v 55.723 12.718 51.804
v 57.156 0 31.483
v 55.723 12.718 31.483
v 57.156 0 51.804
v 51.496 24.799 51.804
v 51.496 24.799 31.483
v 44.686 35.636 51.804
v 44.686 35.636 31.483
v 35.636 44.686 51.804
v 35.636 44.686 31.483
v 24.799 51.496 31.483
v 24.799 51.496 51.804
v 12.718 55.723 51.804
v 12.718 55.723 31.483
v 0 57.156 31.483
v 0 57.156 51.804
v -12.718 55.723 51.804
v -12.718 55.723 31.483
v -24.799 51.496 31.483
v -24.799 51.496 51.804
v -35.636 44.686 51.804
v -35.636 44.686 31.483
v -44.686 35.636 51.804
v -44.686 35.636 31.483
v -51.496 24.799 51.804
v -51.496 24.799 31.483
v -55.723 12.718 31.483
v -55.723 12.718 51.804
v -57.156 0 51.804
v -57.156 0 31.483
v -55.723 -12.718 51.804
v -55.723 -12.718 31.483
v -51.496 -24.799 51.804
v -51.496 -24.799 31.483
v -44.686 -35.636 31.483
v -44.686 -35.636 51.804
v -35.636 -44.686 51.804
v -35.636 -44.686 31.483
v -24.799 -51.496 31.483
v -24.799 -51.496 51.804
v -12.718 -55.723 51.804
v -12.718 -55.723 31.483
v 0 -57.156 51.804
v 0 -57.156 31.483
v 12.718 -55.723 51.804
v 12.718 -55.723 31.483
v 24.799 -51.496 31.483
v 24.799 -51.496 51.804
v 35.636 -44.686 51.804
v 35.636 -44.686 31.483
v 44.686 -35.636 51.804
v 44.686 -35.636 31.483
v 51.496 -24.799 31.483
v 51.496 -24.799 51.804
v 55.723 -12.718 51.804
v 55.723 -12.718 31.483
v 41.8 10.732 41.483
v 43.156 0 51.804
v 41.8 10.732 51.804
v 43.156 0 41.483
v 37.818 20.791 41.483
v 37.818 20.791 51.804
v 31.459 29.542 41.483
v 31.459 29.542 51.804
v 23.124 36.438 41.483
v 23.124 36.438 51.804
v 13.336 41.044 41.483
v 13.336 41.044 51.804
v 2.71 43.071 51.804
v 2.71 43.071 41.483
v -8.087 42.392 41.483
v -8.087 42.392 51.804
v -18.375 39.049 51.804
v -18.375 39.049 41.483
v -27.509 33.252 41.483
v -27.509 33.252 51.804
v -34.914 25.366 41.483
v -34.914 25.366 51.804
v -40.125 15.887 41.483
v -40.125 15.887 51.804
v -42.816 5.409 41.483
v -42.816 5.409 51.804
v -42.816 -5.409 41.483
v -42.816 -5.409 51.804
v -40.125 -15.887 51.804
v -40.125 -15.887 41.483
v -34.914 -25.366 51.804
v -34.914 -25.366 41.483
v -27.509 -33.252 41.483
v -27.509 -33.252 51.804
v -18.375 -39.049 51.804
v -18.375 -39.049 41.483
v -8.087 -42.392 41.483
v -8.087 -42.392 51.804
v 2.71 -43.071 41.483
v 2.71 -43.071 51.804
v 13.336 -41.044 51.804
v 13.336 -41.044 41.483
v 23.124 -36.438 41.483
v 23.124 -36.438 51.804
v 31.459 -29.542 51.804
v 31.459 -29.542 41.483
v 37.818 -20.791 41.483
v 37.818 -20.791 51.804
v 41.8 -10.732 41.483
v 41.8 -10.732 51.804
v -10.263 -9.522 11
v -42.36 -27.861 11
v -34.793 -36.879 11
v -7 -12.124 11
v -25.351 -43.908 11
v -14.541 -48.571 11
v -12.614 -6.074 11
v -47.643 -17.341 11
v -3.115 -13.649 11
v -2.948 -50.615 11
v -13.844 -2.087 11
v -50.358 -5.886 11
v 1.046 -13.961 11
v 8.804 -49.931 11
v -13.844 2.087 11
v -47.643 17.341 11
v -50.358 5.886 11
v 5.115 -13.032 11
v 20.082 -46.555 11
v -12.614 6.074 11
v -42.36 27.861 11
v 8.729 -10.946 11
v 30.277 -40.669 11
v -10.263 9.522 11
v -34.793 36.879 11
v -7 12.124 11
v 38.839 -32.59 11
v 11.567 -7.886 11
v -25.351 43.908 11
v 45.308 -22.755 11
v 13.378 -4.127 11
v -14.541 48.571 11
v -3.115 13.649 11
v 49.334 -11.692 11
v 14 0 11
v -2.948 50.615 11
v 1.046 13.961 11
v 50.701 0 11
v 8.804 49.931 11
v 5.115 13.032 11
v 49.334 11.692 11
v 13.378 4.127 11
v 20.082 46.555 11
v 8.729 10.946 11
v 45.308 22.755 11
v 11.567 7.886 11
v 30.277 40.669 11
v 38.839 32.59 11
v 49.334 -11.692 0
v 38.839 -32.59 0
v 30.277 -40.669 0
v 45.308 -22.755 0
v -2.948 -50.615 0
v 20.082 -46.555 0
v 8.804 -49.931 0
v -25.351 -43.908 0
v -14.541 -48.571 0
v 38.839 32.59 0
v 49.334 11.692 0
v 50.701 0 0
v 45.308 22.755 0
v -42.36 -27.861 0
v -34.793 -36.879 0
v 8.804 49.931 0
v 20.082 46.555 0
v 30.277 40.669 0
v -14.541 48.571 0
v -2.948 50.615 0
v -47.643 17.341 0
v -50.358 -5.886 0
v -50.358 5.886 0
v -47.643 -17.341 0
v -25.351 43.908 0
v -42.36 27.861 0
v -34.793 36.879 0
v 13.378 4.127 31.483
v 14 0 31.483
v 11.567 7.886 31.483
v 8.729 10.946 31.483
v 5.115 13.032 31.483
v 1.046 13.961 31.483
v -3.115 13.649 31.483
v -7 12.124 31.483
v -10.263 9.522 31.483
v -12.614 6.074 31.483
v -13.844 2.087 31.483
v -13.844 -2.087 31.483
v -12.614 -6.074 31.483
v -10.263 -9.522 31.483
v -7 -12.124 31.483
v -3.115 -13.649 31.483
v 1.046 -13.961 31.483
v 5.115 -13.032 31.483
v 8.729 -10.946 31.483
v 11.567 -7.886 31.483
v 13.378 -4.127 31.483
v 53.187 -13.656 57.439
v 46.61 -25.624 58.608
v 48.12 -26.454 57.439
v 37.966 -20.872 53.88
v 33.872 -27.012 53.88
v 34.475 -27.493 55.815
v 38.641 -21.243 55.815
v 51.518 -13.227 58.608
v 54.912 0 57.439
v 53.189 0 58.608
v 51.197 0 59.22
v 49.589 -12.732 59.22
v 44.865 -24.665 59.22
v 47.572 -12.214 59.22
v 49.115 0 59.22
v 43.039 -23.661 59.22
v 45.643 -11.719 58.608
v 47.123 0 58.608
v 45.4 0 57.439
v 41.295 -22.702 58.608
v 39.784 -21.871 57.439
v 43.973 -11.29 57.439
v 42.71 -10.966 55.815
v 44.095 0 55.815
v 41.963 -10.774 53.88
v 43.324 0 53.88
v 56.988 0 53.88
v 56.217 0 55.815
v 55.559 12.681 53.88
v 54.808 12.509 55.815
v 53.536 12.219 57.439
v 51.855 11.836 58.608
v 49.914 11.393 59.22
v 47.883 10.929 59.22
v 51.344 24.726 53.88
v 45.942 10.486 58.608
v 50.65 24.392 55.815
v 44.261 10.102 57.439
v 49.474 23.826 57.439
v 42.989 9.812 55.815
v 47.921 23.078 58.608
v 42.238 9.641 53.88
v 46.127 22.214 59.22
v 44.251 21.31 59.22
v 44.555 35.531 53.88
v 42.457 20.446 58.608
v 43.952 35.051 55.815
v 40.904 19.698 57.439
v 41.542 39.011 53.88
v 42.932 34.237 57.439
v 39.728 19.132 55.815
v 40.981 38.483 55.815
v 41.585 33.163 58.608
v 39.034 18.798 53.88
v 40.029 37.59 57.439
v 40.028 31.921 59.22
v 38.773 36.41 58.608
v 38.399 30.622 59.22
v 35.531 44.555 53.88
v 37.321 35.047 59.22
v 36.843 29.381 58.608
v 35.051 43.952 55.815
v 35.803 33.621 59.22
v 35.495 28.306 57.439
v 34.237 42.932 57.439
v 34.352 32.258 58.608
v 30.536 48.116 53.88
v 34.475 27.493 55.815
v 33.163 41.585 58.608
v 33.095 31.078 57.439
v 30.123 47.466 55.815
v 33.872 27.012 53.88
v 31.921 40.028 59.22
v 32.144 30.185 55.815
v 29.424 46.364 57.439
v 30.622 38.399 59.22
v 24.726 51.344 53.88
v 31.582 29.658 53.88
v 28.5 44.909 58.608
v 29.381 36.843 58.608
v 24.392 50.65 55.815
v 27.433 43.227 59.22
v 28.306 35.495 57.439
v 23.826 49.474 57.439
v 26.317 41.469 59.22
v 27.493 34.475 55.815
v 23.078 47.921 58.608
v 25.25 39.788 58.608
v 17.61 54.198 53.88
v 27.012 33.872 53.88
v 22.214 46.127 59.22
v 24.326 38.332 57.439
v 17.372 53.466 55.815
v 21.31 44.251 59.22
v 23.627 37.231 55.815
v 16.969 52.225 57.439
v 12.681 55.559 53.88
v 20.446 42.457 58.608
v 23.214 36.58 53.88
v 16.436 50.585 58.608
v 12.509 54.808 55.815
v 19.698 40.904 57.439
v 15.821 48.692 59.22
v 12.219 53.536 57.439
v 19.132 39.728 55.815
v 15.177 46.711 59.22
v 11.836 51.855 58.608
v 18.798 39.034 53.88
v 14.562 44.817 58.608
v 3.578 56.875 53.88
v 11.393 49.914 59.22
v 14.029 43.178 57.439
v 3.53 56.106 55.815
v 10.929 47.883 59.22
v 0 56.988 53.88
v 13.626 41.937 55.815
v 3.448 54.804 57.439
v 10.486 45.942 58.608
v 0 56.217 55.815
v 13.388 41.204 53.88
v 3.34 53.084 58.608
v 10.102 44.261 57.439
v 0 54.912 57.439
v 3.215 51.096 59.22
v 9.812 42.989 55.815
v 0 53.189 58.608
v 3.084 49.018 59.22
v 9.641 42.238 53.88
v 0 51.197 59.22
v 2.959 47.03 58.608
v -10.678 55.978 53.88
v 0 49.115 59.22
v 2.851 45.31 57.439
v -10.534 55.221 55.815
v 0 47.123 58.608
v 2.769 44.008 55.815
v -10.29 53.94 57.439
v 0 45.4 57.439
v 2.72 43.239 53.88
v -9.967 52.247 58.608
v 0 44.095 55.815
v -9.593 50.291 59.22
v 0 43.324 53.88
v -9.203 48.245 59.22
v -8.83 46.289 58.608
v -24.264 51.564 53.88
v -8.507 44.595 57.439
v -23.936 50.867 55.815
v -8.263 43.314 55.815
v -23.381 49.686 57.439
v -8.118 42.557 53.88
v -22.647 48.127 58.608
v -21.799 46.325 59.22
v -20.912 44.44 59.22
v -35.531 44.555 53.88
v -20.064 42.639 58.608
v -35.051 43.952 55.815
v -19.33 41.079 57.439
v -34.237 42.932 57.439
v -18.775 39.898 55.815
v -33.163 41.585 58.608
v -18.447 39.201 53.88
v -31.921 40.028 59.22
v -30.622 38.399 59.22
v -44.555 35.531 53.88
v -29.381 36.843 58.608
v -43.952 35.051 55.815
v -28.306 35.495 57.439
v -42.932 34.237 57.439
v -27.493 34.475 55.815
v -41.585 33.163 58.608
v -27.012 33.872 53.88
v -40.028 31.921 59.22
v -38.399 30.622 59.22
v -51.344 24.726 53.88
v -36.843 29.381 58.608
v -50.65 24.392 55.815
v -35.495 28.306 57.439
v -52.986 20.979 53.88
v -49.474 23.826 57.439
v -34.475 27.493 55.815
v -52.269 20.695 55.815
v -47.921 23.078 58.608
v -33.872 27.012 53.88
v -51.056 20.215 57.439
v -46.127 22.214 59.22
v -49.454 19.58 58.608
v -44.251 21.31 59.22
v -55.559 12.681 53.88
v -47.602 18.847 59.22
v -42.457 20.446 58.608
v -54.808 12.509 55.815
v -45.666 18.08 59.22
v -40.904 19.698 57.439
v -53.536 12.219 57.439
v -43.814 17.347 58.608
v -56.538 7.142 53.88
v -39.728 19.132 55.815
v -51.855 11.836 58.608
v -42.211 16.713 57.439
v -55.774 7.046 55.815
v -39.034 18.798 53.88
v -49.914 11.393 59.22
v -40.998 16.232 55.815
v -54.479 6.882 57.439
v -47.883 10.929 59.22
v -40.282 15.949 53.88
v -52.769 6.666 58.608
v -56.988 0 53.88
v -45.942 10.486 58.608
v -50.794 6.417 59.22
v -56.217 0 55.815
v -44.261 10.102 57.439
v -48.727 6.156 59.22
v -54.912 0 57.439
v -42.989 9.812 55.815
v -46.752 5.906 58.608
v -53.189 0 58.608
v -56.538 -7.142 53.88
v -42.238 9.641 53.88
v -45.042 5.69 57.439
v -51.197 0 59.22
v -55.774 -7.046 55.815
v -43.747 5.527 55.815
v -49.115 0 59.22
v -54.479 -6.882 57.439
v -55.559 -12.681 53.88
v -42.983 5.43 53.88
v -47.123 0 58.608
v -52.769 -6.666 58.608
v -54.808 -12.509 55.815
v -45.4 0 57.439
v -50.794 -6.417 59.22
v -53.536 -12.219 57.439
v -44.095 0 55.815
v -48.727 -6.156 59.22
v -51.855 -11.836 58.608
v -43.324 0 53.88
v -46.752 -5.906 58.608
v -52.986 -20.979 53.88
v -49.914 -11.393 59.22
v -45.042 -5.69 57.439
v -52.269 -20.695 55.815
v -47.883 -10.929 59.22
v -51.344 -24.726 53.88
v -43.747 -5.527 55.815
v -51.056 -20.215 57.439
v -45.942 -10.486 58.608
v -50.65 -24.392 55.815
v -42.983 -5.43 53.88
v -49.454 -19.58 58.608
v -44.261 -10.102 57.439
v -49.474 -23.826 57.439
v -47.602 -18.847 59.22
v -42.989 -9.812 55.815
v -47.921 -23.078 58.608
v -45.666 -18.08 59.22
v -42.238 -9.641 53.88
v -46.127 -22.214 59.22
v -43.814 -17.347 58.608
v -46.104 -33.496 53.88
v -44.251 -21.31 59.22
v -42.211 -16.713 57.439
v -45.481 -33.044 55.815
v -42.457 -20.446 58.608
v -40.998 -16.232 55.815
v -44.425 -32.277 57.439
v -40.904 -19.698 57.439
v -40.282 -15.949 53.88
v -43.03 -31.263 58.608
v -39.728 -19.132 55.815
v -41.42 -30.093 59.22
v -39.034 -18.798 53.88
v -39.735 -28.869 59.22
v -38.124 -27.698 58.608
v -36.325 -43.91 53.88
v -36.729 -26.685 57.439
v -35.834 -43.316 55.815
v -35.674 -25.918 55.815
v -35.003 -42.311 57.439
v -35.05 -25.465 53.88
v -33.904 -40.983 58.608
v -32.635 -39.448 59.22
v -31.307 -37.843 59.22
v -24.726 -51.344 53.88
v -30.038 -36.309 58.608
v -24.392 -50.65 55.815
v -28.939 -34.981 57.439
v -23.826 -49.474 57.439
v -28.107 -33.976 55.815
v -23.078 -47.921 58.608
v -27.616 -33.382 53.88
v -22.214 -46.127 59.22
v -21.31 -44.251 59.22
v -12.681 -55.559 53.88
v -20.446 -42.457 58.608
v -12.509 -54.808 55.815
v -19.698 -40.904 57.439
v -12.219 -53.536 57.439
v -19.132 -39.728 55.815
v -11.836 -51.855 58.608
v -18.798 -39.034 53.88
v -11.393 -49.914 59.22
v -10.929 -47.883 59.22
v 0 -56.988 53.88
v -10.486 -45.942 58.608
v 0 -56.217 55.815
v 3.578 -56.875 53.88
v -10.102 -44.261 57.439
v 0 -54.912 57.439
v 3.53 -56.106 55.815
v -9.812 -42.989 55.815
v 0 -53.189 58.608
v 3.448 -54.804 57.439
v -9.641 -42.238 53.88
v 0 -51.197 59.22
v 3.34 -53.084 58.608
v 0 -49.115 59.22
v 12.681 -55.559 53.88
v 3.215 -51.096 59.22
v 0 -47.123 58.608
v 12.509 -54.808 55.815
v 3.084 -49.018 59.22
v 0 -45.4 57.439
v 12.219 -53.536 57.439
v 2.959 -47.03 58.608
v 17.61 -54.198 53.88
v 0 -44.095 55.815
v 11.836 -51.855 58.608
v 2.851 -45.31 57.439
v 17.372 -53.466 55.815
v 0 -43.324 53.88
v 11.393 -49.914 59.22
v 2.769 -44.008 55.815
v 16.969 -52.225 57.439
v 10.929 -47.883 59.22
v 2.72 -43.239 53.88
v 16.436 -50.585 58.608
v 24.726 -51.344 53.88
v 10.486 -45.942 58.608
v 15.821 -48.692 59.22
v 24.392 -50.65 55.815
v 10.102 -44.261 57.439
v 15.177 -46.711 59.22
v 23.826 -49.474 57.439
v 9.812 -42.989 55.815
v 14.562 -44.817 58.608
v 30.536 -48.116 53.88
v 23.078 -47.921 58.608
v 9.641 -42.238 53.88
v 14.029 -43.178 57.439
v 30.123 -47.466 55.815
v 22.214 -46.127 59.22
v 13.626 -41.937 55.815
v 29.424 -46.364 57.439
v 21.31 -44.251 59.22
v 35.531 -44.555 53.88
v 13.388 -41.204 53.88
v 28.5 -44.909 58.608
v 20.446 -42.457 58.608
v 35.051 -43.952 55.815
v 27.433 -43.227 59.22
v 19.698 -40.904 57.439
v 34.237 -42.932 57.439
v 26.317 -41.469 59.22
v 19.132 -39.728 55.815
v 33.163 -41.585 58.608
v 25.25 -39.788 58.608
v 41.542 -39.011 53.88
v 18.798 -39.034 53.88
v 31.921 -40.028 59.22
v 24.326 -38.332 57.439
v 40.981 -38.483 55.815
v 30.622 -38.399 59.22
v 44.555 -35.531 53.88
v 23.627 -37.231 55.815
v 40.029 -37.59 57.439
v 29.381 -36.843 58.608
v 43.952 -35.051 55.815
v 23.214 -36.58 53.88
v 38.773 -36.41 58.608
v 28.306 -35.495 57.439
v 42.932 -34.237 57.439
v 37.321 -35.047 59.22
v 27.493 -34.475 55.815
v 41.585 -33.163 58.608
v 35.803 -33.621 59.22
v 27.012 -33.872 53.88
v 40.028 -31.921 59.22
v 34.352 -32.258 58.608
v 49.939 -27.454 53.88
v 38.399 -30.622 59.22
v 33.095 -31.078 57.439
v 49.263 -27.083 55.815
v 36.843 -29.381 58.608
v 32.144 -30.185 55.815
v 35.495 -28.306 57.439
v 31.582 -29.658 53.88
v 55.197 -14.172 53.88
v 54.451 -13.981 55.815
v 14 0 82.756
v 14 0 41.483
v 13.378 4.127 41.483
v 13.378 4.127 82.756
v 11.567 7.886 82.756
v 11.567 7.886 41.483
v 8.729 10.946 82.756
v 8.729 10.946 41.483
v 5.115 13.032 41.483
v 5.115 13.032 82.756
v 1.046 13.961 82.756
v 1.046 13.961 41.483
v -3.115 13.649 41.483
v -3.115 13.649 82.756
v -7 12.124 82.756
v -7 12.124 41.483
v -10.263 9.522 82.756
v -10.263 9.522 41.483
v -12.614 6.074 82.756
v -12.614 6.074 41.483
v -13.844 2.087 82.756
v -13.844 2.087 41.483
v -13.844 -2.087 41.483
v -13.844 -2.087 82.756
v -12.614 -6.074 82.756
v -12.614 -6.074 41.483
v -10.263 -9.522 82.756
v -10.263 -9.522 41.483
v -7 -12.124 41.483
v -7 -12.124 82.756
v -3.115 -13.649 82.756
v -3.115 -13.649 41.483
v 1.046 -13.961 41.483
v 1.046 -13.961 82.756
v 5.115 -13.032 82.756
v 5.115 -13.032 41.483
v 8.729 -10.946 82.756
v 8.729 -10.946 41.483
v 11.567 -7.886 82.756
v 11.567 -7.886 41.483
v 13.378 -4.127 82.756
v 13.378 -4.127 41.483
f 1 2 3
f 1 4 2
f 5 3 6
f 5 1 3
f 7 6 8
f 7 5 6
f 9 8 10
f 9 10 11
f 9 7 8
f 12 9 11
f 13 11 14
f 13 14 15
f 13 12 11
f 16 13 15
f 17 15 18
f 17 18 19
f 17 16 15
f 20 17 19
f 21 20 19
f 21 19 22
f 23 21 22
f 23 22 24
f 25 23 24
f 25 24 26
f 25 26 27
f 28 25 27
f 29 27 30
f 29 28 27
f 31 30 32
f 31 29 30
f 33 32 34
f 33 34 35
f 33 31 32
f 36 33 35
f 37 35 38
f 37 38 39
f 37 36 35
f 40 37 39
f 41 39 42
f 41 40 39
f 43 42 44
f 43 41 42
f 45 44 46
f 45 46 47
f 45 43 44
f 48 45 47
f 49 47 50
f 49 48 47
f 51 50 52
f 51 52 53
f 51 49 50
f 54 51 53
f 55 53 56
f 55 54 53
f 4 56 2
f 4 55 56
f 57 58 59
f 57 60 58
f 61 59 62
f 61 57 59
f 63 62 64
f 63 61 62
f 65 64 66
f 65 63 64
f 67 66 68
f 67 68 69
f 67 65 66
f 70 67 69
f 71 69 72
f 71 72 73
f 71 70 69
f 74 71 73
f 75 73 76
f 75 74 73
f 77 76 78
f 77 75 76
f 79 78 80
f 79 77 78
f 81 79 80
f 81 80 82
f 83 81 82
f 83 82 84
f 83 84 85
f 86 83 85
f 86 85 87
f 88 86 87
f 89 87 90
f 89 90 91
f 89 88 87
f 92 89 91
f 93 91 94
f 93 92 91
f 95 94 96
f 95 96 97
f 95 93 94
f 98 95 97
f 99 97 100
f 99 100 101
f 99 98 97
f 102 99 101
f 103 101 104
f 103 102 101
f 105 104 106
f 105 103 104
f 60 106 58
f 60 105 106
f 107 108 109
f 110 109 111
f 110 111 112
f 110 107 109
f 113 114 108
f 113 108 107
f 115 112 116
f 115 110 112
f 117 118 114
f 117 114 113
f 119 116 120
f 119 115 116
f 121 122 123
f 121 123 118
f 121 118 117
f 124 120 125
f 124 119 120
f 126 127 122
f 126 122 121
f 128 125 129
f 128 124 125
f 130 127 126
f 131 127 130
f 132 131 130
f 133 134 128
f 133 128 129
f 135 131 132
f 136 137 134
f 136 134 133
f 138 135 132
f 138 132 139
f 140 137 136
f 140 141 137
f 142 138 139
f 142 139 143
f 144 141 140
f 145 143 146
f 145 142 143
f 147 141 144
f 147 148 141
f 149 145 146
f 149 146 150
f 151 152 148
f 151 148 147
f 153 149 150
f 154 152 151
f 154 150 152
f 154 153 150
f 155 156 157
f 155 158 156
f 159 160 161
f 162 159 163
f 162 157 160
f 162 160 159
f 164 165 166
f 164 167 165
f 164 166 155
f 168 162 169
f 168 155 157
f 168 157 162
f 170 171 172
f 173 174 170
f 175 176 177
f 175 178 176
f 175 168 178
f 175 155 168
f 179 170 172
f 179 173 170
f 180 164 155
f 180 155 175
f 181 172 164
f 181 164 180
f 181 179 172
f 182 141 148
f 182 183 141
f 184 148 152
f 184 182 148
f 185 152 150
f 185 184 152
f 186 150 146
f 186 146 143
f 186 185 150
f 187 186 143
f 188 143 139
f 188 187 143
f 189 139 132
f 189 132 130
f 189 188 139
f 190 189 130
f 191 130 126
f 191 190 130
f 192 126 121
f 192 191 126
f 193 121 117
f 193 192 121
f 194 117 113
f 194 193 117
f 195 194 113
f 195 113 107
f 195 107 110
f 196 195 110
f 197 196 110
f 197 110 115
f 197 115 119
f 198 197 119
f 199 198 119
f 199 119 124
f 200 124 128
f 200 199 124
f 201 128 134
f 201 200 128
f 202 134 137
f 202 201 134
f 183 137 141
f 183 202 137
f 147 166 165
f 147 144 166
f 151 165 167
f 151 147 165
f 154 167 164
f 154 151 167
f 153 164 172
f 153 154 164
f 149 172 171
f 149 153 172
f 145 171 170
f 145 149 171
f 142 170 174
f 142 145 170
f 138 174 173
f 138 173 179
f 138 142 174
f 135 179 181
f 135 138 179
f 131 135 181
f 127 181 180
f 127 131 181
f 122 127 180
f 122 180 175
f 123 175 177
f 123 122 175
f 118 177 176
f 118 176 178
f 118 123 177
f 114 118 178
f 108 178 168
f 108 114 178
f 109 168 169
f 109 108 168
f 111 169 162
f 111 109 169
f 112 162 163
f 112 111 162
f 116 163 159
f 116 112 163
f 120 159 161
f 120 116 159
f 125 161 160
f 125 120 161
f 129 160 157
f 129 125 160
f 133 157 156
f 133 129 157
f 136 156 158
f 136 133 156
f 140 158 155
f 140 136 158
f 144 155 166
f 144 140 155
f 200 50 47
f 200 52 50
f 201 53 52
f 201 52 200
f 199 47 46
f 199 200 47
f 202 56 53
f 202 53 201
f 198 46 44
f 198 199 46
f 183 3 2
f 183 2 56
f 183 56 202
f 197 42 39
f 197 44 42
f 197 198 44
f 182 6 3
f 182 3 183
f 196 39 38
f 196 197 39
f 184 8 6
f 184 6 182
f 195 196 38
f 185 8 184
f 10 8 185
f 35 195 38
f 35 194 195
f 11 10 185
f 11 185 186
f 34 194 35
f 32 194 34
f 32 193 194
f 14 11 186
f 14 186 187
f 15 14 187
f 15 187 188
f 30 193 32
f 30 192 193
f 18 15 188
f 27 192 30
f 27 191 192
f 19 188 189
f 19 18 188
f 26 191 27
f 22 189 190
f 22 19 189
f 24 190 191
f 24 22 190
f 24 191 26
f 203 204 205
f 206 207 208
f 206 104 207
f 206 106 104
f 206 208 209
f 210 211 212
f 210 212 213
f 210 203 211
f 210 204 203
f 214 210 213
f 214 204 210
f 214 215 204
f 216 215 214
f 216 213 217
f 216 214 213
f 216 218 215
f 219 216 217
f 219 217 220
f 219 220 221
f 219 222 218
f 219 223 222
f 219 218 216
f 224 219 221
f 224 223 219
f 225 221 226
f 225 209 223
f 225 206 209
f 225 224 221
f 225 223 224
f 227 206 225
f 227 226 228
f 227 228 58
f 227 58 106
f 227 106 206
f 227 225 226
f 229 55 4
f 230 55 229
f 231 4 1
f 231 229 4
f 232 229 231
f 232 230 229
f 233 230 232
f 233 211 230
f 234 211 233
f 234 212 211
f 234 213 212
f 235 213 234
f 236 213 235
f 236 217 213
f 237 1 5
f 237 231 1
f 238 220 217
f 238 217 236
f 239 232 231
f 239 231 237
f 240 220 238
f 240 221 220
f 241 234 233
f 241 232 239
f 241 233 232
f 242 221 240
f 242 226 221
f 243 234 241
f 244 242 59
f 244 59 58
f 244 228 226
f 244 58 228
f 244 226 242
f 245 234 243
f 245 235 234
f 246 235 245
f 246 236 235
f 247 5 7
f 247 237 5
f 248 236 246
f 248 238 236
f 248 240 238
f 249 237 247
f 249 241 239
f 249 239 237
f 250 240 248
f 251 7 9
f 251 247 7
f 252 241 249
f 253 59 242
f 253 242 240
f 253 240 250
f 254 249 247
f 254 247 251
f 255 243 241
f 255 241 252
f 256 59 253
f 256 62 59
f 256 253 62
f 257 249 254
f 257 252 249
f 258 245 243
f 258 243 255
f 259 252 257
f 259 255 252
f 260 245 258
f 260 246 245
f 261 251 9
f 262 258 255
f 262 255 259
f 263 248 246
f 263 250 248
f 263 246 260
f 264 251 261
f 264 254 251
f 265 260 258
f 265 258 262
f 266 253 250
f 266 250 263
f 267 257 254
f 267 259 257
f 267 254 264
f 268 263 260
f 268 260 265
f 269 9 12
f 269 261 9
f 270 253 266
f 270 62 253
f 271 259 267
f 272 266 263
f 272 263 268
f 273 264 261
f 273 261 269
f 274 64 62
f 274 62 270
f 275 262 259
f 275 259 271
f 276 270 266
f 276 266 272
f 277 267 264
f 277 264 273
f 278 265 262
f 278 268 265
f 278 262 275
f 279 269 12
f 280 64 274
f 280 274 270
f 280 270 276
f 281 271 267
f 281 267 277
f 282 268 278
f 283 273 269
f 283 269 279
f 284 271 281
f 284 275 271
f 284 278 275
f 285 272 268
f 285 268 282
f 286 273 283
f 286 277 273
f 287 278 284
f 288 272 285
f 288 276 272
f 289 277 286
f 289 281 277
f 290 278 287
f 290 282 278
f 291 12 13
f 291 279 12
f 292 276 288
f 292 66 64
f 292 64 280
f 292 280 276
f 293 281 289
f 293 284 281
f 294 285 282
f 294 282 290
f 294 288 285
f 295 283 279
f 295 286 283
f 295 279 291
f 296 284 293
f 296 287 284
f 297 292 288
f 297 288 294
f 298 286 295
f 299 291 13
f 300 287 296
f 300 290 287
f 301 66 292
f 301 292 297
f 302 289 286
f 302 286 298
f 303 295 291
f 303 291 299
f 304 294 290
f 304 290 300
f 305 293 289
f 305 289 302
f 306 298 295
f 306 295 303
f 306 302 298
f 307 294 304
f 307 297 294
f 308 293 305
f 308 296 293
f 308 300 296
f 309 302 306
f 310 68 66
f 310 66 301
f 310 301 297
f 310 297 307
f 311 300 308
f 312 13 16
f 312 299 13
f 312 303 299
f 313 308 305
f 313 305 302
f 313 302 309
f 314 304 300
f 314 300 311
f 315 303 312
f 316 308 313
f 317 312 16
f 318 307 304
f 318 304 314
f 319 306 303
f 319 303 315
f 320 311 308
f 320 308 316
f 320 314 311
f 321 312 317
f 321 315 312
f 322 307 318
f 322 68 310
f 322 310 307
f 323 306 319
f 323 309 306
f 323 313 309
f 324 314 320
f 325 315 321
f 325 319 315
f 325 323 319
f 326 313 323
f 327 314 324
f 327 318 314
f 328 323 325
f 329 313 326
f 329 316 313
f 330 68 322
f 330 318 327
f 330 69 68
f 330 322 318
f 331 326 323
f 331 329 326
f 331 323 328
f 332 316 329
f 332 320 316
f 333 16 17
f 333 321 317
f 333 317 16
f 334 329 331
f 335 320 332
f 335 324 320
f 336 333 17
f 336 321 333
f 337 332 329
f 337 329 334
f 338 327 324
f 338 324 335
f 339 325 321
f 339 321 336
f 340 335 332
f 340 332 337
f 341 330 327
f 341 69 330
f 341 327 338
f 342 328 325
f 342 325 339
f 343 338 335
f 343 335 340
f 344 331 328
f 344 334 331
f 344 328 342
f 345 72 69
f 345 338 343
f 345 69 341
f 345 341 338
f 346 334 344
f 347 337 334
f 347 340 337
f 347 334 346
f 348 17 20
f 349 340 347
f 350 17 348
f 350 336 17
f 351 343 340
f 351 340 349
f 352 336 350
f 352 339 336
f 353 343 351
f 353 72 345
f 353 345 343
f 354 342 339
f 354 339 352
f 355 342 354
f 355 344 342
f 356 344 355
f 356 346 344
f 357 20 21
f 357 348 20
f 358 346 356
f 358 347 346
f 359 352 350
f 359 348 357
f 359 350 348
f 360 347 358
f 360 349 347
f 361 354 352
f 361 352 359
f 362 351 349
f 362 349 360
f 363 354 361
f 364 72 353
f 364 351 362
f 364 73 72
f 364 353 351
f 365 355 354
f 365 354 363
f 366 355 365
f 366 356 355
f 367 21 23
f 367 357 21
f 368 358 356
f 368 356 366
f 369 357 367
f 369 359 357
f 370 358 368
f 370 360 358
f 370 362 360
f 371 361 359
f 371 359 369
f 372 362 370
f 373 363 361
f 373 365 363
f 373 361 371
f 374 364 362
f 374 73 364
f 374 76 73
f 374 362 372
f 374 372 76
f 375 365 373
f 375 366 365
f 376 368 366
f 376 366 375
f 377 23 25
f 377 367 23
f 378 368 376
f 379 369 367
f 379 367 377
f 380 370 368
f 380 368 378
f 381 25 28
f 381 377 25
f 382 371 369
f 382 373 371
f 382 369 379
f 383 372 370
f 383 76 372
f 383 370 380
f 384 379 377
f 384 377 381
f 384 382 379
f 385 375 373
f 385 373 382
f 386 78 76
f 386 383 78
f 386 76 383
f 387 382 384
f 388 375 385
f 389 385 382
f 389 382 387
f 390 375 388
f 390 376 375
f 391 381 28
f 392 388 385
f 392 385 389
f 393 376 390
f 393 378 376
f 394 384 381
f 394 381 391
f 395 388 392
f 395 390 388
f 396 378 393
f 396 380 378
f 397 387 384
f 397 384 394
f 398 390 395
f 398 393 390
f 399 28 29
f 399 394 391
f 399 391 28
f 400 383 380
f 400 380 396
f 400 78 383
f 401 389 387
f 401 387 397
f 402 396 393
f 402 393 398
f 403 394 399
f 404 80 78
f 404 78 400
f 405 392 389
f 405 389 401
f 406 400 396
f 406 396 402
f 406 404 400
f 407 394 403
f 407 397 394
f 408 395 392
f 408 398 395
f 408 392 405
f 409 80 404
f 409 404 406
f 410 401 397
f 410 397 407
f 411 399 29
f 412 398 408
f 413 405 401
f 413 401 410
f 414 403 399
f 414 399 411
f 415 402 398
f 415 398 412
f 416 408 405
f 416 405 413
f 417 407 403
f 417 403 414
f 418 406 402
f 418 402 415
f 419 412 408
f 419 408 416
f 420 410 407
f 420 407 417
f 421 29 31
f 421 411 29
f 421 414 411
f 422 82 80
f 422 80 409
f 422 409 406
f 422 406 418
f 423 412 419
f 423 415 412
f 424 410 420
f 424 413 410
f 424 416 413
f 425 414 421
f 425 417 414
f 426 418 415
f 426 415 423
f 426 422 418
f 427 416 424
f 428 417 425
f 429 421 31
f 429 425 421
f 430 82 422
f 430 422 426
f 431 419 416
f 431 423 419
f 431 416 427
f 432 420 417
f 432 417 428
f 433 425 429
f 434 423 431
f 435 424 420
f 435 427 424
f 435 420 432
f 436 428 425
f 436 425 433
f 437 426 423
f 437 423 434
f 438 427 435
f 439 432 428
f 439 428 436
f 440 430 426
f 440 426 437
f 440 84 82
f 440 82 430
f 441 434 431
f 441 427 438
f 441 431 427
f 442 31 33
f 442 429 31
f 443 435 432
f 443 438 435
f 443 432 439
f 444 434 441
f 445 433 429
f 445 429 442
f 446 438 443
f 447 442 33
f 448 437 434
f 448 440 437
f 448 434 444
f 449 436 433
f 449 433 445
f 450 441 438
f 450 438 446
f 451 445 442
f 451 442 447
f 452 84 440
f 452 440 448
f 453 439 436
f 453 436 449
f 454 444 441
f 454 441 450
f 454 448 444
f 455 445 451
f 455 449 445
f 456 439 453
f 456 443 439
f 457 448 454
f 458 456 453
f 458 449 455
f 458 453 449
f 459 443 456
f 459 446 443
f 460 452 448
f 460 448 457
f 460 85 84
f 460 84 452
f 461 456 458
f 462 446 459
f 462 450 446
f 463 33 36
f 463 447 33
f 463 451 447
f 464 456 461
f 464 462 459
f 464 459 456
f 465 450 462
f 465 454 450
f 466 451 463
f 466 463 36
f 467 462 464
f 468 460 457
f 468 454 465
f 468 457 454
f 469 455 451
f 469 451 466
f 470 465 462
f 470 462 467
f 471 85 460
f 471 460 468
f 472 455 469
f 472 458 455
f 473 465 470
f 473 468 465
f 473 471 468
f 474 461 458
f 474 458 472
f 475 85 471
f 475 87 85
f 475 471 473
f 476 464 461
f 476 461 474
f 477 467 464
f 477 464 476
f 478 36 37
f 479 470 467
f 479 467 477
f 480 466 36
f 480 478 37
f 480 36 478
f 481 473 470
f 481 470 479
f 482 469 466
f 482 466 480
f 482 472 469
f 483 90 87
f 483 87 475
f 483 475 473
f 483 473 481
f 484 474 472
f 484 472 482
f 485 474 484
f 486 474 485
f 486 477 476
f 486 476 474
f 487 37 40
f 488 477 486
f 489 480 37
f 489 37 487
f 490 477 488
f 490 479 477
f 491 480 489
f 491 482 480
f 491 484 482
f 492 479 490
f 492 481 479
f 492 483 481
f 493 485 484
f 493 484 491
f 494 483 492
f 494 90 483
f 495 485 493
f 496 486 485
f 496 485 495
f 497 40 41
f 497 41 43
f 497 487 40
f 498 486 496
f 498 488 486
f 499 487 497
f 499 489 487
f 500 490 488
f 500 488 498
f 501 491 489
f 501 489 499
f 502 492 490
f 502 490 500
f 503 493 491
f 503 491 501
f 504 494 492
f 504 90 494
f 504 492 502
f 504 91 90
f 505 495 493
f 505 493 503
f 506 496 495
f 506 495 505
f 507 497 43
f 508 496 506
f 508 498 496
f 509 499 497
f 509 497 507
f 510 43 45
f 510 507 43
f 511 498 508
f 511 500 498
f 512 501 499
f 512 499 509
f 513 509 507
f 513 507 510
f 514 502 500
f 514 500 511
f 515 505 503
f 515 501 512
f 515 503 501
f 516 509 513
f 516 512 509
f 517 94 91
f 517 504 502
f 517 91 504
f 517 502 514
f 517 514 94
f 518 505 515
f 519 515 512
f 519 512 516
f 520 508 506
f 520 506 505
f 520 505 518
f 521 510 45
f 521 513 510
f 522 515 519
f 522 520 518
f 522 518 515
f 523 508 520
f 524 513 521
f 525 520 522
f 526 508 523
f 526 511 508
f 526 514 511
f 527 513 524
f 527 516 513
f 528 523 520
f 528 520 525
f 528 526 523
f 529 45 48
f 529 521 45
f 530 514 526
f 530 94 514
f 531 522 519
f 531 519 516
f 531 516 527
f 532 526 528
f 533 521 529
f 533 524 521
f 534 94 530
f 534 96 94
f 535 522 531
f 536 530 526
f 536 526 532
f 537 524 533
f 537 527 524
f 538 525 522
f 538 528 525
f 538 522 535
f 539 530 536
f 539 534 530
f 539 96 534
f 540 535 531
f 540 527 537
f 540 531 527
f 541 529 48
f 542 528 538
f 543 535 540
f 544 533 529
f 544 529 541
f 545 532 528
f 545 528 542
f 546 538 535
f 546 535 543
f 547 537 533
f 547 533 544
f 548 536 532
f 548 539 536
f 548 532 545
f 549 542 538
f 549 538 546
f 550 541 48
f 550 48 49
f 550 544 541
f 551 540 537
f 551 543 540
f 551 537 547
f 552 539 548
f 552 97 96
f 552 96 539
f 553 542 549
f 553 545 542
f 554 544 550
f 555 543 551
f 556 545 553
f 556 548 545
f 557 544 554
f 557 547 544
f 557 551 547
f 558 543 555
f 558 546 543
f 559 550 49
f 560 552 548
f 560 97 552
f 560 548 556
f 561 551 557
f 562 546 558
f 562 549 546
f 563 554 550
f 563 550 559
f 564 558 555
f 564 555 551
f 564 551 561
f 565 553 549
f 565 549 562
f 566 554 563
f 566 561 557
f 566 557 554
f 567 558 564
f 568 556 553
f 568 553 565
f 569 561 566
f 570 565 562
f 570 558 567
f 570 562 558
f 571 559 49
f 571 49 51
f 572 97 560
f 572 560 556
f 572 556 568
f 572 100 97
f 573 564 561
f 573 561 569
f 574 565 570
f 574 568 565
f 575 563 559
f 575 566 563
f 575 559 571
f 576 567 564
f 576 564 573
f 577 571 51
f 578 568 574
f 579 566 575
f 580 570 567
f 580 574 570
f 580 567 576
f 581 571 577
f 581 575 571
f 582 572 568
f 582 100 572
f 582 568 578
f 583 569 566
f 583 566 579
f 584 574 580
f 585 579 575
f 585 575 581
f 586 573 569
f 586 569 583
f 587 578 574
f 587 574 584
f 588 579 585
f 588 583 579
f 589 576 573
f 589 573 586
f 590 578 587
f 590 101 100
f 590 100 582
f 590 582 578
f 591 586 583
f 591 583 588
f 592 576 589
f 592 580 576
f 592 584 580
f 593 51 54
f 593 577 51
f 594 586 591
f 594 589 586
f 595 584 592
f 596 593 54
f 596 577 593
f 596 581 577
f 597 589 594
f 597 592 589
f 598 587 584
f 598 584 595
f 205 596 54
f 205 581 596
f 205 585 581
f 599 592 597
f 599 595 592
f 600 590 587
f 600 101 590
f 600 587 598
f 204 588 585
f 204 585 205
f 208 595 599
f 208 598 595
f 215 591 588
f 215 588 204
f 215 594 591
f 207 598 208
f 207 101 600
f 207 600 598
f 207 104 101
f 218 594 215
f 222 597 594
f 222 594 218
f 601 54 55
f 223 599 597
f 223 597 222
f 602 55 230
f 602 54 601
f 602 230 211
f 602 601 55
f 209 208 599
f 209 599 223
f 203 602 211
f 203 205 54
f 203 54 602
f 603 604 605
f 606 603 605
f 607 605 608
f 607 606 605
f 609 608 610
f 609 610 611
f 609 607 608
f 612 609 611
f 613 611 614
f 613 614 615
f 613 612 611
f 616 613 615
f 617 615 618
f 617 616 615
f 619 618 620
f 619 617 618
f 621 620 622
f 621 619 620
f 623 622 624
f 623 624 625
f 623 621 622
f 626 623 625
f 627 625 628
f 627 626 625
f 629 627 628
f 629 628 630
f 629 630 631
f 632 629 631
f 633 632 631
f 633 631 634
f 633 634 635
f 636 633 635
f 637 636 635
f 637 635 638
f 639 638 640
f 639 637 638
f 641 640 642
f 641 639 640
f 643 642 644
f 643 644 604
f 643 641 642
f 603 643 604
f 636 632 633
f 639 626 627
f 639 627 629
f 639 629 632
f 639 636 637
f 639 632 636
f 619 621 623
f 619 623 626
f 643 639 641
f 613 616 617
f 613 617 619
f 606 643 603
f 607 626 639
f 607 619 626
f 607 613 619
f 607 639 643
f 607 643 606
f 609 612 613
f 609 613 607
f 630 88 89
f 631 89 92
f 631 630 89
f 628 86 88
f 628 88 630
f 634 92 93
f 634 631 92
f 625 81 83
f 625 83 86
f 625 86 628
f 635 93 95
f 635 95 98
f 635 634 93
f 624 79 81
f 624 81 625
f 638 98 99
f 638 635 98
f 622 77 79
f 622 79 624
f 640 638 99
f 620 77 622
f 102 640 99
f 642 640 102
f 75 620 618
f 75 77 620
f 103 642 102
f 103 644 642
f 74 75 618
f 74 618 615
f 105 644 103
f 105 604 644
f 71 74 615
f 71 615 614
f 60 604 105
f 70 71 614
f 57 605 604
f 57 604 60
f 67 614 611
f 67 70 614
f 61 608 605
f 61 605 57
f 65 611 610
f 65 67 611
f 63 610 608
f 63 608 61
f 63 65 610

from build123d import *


with BuildPart() as f1:
    # F0 (on Front) → F1 (revolve)
    with BuildSketch(Plane.XZ):
        with BuildLine():
            Line((0, 11), (0, 0))
            Line((0, 0), (50.701149, 0))
            Line((50.701149, 0), (50.701149, 11))
            Line((50.701149, 11), (14, 11))
            Line((14, 11), (14, 31.482756))
            Line((14, 31.482756), (57.156043, 31.482756))
            Line((57.156043, 31.482756), (57.156043, 41.482756))
            Line((57.156043, 41.482756), (57.156043, 51.804224))
            ThreePointArc((57.156043, 51.804224), (50.156043, 59.297508), (43.156043, 51.804224))
            Line((43.156043, 51.804224), (43.156043, 41.482756))
            Line((43.156043, 41.482756), (14, 41.482756))
            Line((14, 41.482756), (14, 51.804224))
            Line((14, 51.804224), (14, 53.735629))
            Line((14, 53.735629), (14, 82.755983))
            Line((14, 82.755983), (0, 82.755983))
            Line((0, 82.755983), (0, 69.811666))
            Line((0, 69.811666), (0, 53.735629))
            Line((0, 53.735629), (0, 11))
        make_face()
    revolve(axis=Axis((0, 0, 32.367814), (0, 0, 1)))


solid = f1.part
